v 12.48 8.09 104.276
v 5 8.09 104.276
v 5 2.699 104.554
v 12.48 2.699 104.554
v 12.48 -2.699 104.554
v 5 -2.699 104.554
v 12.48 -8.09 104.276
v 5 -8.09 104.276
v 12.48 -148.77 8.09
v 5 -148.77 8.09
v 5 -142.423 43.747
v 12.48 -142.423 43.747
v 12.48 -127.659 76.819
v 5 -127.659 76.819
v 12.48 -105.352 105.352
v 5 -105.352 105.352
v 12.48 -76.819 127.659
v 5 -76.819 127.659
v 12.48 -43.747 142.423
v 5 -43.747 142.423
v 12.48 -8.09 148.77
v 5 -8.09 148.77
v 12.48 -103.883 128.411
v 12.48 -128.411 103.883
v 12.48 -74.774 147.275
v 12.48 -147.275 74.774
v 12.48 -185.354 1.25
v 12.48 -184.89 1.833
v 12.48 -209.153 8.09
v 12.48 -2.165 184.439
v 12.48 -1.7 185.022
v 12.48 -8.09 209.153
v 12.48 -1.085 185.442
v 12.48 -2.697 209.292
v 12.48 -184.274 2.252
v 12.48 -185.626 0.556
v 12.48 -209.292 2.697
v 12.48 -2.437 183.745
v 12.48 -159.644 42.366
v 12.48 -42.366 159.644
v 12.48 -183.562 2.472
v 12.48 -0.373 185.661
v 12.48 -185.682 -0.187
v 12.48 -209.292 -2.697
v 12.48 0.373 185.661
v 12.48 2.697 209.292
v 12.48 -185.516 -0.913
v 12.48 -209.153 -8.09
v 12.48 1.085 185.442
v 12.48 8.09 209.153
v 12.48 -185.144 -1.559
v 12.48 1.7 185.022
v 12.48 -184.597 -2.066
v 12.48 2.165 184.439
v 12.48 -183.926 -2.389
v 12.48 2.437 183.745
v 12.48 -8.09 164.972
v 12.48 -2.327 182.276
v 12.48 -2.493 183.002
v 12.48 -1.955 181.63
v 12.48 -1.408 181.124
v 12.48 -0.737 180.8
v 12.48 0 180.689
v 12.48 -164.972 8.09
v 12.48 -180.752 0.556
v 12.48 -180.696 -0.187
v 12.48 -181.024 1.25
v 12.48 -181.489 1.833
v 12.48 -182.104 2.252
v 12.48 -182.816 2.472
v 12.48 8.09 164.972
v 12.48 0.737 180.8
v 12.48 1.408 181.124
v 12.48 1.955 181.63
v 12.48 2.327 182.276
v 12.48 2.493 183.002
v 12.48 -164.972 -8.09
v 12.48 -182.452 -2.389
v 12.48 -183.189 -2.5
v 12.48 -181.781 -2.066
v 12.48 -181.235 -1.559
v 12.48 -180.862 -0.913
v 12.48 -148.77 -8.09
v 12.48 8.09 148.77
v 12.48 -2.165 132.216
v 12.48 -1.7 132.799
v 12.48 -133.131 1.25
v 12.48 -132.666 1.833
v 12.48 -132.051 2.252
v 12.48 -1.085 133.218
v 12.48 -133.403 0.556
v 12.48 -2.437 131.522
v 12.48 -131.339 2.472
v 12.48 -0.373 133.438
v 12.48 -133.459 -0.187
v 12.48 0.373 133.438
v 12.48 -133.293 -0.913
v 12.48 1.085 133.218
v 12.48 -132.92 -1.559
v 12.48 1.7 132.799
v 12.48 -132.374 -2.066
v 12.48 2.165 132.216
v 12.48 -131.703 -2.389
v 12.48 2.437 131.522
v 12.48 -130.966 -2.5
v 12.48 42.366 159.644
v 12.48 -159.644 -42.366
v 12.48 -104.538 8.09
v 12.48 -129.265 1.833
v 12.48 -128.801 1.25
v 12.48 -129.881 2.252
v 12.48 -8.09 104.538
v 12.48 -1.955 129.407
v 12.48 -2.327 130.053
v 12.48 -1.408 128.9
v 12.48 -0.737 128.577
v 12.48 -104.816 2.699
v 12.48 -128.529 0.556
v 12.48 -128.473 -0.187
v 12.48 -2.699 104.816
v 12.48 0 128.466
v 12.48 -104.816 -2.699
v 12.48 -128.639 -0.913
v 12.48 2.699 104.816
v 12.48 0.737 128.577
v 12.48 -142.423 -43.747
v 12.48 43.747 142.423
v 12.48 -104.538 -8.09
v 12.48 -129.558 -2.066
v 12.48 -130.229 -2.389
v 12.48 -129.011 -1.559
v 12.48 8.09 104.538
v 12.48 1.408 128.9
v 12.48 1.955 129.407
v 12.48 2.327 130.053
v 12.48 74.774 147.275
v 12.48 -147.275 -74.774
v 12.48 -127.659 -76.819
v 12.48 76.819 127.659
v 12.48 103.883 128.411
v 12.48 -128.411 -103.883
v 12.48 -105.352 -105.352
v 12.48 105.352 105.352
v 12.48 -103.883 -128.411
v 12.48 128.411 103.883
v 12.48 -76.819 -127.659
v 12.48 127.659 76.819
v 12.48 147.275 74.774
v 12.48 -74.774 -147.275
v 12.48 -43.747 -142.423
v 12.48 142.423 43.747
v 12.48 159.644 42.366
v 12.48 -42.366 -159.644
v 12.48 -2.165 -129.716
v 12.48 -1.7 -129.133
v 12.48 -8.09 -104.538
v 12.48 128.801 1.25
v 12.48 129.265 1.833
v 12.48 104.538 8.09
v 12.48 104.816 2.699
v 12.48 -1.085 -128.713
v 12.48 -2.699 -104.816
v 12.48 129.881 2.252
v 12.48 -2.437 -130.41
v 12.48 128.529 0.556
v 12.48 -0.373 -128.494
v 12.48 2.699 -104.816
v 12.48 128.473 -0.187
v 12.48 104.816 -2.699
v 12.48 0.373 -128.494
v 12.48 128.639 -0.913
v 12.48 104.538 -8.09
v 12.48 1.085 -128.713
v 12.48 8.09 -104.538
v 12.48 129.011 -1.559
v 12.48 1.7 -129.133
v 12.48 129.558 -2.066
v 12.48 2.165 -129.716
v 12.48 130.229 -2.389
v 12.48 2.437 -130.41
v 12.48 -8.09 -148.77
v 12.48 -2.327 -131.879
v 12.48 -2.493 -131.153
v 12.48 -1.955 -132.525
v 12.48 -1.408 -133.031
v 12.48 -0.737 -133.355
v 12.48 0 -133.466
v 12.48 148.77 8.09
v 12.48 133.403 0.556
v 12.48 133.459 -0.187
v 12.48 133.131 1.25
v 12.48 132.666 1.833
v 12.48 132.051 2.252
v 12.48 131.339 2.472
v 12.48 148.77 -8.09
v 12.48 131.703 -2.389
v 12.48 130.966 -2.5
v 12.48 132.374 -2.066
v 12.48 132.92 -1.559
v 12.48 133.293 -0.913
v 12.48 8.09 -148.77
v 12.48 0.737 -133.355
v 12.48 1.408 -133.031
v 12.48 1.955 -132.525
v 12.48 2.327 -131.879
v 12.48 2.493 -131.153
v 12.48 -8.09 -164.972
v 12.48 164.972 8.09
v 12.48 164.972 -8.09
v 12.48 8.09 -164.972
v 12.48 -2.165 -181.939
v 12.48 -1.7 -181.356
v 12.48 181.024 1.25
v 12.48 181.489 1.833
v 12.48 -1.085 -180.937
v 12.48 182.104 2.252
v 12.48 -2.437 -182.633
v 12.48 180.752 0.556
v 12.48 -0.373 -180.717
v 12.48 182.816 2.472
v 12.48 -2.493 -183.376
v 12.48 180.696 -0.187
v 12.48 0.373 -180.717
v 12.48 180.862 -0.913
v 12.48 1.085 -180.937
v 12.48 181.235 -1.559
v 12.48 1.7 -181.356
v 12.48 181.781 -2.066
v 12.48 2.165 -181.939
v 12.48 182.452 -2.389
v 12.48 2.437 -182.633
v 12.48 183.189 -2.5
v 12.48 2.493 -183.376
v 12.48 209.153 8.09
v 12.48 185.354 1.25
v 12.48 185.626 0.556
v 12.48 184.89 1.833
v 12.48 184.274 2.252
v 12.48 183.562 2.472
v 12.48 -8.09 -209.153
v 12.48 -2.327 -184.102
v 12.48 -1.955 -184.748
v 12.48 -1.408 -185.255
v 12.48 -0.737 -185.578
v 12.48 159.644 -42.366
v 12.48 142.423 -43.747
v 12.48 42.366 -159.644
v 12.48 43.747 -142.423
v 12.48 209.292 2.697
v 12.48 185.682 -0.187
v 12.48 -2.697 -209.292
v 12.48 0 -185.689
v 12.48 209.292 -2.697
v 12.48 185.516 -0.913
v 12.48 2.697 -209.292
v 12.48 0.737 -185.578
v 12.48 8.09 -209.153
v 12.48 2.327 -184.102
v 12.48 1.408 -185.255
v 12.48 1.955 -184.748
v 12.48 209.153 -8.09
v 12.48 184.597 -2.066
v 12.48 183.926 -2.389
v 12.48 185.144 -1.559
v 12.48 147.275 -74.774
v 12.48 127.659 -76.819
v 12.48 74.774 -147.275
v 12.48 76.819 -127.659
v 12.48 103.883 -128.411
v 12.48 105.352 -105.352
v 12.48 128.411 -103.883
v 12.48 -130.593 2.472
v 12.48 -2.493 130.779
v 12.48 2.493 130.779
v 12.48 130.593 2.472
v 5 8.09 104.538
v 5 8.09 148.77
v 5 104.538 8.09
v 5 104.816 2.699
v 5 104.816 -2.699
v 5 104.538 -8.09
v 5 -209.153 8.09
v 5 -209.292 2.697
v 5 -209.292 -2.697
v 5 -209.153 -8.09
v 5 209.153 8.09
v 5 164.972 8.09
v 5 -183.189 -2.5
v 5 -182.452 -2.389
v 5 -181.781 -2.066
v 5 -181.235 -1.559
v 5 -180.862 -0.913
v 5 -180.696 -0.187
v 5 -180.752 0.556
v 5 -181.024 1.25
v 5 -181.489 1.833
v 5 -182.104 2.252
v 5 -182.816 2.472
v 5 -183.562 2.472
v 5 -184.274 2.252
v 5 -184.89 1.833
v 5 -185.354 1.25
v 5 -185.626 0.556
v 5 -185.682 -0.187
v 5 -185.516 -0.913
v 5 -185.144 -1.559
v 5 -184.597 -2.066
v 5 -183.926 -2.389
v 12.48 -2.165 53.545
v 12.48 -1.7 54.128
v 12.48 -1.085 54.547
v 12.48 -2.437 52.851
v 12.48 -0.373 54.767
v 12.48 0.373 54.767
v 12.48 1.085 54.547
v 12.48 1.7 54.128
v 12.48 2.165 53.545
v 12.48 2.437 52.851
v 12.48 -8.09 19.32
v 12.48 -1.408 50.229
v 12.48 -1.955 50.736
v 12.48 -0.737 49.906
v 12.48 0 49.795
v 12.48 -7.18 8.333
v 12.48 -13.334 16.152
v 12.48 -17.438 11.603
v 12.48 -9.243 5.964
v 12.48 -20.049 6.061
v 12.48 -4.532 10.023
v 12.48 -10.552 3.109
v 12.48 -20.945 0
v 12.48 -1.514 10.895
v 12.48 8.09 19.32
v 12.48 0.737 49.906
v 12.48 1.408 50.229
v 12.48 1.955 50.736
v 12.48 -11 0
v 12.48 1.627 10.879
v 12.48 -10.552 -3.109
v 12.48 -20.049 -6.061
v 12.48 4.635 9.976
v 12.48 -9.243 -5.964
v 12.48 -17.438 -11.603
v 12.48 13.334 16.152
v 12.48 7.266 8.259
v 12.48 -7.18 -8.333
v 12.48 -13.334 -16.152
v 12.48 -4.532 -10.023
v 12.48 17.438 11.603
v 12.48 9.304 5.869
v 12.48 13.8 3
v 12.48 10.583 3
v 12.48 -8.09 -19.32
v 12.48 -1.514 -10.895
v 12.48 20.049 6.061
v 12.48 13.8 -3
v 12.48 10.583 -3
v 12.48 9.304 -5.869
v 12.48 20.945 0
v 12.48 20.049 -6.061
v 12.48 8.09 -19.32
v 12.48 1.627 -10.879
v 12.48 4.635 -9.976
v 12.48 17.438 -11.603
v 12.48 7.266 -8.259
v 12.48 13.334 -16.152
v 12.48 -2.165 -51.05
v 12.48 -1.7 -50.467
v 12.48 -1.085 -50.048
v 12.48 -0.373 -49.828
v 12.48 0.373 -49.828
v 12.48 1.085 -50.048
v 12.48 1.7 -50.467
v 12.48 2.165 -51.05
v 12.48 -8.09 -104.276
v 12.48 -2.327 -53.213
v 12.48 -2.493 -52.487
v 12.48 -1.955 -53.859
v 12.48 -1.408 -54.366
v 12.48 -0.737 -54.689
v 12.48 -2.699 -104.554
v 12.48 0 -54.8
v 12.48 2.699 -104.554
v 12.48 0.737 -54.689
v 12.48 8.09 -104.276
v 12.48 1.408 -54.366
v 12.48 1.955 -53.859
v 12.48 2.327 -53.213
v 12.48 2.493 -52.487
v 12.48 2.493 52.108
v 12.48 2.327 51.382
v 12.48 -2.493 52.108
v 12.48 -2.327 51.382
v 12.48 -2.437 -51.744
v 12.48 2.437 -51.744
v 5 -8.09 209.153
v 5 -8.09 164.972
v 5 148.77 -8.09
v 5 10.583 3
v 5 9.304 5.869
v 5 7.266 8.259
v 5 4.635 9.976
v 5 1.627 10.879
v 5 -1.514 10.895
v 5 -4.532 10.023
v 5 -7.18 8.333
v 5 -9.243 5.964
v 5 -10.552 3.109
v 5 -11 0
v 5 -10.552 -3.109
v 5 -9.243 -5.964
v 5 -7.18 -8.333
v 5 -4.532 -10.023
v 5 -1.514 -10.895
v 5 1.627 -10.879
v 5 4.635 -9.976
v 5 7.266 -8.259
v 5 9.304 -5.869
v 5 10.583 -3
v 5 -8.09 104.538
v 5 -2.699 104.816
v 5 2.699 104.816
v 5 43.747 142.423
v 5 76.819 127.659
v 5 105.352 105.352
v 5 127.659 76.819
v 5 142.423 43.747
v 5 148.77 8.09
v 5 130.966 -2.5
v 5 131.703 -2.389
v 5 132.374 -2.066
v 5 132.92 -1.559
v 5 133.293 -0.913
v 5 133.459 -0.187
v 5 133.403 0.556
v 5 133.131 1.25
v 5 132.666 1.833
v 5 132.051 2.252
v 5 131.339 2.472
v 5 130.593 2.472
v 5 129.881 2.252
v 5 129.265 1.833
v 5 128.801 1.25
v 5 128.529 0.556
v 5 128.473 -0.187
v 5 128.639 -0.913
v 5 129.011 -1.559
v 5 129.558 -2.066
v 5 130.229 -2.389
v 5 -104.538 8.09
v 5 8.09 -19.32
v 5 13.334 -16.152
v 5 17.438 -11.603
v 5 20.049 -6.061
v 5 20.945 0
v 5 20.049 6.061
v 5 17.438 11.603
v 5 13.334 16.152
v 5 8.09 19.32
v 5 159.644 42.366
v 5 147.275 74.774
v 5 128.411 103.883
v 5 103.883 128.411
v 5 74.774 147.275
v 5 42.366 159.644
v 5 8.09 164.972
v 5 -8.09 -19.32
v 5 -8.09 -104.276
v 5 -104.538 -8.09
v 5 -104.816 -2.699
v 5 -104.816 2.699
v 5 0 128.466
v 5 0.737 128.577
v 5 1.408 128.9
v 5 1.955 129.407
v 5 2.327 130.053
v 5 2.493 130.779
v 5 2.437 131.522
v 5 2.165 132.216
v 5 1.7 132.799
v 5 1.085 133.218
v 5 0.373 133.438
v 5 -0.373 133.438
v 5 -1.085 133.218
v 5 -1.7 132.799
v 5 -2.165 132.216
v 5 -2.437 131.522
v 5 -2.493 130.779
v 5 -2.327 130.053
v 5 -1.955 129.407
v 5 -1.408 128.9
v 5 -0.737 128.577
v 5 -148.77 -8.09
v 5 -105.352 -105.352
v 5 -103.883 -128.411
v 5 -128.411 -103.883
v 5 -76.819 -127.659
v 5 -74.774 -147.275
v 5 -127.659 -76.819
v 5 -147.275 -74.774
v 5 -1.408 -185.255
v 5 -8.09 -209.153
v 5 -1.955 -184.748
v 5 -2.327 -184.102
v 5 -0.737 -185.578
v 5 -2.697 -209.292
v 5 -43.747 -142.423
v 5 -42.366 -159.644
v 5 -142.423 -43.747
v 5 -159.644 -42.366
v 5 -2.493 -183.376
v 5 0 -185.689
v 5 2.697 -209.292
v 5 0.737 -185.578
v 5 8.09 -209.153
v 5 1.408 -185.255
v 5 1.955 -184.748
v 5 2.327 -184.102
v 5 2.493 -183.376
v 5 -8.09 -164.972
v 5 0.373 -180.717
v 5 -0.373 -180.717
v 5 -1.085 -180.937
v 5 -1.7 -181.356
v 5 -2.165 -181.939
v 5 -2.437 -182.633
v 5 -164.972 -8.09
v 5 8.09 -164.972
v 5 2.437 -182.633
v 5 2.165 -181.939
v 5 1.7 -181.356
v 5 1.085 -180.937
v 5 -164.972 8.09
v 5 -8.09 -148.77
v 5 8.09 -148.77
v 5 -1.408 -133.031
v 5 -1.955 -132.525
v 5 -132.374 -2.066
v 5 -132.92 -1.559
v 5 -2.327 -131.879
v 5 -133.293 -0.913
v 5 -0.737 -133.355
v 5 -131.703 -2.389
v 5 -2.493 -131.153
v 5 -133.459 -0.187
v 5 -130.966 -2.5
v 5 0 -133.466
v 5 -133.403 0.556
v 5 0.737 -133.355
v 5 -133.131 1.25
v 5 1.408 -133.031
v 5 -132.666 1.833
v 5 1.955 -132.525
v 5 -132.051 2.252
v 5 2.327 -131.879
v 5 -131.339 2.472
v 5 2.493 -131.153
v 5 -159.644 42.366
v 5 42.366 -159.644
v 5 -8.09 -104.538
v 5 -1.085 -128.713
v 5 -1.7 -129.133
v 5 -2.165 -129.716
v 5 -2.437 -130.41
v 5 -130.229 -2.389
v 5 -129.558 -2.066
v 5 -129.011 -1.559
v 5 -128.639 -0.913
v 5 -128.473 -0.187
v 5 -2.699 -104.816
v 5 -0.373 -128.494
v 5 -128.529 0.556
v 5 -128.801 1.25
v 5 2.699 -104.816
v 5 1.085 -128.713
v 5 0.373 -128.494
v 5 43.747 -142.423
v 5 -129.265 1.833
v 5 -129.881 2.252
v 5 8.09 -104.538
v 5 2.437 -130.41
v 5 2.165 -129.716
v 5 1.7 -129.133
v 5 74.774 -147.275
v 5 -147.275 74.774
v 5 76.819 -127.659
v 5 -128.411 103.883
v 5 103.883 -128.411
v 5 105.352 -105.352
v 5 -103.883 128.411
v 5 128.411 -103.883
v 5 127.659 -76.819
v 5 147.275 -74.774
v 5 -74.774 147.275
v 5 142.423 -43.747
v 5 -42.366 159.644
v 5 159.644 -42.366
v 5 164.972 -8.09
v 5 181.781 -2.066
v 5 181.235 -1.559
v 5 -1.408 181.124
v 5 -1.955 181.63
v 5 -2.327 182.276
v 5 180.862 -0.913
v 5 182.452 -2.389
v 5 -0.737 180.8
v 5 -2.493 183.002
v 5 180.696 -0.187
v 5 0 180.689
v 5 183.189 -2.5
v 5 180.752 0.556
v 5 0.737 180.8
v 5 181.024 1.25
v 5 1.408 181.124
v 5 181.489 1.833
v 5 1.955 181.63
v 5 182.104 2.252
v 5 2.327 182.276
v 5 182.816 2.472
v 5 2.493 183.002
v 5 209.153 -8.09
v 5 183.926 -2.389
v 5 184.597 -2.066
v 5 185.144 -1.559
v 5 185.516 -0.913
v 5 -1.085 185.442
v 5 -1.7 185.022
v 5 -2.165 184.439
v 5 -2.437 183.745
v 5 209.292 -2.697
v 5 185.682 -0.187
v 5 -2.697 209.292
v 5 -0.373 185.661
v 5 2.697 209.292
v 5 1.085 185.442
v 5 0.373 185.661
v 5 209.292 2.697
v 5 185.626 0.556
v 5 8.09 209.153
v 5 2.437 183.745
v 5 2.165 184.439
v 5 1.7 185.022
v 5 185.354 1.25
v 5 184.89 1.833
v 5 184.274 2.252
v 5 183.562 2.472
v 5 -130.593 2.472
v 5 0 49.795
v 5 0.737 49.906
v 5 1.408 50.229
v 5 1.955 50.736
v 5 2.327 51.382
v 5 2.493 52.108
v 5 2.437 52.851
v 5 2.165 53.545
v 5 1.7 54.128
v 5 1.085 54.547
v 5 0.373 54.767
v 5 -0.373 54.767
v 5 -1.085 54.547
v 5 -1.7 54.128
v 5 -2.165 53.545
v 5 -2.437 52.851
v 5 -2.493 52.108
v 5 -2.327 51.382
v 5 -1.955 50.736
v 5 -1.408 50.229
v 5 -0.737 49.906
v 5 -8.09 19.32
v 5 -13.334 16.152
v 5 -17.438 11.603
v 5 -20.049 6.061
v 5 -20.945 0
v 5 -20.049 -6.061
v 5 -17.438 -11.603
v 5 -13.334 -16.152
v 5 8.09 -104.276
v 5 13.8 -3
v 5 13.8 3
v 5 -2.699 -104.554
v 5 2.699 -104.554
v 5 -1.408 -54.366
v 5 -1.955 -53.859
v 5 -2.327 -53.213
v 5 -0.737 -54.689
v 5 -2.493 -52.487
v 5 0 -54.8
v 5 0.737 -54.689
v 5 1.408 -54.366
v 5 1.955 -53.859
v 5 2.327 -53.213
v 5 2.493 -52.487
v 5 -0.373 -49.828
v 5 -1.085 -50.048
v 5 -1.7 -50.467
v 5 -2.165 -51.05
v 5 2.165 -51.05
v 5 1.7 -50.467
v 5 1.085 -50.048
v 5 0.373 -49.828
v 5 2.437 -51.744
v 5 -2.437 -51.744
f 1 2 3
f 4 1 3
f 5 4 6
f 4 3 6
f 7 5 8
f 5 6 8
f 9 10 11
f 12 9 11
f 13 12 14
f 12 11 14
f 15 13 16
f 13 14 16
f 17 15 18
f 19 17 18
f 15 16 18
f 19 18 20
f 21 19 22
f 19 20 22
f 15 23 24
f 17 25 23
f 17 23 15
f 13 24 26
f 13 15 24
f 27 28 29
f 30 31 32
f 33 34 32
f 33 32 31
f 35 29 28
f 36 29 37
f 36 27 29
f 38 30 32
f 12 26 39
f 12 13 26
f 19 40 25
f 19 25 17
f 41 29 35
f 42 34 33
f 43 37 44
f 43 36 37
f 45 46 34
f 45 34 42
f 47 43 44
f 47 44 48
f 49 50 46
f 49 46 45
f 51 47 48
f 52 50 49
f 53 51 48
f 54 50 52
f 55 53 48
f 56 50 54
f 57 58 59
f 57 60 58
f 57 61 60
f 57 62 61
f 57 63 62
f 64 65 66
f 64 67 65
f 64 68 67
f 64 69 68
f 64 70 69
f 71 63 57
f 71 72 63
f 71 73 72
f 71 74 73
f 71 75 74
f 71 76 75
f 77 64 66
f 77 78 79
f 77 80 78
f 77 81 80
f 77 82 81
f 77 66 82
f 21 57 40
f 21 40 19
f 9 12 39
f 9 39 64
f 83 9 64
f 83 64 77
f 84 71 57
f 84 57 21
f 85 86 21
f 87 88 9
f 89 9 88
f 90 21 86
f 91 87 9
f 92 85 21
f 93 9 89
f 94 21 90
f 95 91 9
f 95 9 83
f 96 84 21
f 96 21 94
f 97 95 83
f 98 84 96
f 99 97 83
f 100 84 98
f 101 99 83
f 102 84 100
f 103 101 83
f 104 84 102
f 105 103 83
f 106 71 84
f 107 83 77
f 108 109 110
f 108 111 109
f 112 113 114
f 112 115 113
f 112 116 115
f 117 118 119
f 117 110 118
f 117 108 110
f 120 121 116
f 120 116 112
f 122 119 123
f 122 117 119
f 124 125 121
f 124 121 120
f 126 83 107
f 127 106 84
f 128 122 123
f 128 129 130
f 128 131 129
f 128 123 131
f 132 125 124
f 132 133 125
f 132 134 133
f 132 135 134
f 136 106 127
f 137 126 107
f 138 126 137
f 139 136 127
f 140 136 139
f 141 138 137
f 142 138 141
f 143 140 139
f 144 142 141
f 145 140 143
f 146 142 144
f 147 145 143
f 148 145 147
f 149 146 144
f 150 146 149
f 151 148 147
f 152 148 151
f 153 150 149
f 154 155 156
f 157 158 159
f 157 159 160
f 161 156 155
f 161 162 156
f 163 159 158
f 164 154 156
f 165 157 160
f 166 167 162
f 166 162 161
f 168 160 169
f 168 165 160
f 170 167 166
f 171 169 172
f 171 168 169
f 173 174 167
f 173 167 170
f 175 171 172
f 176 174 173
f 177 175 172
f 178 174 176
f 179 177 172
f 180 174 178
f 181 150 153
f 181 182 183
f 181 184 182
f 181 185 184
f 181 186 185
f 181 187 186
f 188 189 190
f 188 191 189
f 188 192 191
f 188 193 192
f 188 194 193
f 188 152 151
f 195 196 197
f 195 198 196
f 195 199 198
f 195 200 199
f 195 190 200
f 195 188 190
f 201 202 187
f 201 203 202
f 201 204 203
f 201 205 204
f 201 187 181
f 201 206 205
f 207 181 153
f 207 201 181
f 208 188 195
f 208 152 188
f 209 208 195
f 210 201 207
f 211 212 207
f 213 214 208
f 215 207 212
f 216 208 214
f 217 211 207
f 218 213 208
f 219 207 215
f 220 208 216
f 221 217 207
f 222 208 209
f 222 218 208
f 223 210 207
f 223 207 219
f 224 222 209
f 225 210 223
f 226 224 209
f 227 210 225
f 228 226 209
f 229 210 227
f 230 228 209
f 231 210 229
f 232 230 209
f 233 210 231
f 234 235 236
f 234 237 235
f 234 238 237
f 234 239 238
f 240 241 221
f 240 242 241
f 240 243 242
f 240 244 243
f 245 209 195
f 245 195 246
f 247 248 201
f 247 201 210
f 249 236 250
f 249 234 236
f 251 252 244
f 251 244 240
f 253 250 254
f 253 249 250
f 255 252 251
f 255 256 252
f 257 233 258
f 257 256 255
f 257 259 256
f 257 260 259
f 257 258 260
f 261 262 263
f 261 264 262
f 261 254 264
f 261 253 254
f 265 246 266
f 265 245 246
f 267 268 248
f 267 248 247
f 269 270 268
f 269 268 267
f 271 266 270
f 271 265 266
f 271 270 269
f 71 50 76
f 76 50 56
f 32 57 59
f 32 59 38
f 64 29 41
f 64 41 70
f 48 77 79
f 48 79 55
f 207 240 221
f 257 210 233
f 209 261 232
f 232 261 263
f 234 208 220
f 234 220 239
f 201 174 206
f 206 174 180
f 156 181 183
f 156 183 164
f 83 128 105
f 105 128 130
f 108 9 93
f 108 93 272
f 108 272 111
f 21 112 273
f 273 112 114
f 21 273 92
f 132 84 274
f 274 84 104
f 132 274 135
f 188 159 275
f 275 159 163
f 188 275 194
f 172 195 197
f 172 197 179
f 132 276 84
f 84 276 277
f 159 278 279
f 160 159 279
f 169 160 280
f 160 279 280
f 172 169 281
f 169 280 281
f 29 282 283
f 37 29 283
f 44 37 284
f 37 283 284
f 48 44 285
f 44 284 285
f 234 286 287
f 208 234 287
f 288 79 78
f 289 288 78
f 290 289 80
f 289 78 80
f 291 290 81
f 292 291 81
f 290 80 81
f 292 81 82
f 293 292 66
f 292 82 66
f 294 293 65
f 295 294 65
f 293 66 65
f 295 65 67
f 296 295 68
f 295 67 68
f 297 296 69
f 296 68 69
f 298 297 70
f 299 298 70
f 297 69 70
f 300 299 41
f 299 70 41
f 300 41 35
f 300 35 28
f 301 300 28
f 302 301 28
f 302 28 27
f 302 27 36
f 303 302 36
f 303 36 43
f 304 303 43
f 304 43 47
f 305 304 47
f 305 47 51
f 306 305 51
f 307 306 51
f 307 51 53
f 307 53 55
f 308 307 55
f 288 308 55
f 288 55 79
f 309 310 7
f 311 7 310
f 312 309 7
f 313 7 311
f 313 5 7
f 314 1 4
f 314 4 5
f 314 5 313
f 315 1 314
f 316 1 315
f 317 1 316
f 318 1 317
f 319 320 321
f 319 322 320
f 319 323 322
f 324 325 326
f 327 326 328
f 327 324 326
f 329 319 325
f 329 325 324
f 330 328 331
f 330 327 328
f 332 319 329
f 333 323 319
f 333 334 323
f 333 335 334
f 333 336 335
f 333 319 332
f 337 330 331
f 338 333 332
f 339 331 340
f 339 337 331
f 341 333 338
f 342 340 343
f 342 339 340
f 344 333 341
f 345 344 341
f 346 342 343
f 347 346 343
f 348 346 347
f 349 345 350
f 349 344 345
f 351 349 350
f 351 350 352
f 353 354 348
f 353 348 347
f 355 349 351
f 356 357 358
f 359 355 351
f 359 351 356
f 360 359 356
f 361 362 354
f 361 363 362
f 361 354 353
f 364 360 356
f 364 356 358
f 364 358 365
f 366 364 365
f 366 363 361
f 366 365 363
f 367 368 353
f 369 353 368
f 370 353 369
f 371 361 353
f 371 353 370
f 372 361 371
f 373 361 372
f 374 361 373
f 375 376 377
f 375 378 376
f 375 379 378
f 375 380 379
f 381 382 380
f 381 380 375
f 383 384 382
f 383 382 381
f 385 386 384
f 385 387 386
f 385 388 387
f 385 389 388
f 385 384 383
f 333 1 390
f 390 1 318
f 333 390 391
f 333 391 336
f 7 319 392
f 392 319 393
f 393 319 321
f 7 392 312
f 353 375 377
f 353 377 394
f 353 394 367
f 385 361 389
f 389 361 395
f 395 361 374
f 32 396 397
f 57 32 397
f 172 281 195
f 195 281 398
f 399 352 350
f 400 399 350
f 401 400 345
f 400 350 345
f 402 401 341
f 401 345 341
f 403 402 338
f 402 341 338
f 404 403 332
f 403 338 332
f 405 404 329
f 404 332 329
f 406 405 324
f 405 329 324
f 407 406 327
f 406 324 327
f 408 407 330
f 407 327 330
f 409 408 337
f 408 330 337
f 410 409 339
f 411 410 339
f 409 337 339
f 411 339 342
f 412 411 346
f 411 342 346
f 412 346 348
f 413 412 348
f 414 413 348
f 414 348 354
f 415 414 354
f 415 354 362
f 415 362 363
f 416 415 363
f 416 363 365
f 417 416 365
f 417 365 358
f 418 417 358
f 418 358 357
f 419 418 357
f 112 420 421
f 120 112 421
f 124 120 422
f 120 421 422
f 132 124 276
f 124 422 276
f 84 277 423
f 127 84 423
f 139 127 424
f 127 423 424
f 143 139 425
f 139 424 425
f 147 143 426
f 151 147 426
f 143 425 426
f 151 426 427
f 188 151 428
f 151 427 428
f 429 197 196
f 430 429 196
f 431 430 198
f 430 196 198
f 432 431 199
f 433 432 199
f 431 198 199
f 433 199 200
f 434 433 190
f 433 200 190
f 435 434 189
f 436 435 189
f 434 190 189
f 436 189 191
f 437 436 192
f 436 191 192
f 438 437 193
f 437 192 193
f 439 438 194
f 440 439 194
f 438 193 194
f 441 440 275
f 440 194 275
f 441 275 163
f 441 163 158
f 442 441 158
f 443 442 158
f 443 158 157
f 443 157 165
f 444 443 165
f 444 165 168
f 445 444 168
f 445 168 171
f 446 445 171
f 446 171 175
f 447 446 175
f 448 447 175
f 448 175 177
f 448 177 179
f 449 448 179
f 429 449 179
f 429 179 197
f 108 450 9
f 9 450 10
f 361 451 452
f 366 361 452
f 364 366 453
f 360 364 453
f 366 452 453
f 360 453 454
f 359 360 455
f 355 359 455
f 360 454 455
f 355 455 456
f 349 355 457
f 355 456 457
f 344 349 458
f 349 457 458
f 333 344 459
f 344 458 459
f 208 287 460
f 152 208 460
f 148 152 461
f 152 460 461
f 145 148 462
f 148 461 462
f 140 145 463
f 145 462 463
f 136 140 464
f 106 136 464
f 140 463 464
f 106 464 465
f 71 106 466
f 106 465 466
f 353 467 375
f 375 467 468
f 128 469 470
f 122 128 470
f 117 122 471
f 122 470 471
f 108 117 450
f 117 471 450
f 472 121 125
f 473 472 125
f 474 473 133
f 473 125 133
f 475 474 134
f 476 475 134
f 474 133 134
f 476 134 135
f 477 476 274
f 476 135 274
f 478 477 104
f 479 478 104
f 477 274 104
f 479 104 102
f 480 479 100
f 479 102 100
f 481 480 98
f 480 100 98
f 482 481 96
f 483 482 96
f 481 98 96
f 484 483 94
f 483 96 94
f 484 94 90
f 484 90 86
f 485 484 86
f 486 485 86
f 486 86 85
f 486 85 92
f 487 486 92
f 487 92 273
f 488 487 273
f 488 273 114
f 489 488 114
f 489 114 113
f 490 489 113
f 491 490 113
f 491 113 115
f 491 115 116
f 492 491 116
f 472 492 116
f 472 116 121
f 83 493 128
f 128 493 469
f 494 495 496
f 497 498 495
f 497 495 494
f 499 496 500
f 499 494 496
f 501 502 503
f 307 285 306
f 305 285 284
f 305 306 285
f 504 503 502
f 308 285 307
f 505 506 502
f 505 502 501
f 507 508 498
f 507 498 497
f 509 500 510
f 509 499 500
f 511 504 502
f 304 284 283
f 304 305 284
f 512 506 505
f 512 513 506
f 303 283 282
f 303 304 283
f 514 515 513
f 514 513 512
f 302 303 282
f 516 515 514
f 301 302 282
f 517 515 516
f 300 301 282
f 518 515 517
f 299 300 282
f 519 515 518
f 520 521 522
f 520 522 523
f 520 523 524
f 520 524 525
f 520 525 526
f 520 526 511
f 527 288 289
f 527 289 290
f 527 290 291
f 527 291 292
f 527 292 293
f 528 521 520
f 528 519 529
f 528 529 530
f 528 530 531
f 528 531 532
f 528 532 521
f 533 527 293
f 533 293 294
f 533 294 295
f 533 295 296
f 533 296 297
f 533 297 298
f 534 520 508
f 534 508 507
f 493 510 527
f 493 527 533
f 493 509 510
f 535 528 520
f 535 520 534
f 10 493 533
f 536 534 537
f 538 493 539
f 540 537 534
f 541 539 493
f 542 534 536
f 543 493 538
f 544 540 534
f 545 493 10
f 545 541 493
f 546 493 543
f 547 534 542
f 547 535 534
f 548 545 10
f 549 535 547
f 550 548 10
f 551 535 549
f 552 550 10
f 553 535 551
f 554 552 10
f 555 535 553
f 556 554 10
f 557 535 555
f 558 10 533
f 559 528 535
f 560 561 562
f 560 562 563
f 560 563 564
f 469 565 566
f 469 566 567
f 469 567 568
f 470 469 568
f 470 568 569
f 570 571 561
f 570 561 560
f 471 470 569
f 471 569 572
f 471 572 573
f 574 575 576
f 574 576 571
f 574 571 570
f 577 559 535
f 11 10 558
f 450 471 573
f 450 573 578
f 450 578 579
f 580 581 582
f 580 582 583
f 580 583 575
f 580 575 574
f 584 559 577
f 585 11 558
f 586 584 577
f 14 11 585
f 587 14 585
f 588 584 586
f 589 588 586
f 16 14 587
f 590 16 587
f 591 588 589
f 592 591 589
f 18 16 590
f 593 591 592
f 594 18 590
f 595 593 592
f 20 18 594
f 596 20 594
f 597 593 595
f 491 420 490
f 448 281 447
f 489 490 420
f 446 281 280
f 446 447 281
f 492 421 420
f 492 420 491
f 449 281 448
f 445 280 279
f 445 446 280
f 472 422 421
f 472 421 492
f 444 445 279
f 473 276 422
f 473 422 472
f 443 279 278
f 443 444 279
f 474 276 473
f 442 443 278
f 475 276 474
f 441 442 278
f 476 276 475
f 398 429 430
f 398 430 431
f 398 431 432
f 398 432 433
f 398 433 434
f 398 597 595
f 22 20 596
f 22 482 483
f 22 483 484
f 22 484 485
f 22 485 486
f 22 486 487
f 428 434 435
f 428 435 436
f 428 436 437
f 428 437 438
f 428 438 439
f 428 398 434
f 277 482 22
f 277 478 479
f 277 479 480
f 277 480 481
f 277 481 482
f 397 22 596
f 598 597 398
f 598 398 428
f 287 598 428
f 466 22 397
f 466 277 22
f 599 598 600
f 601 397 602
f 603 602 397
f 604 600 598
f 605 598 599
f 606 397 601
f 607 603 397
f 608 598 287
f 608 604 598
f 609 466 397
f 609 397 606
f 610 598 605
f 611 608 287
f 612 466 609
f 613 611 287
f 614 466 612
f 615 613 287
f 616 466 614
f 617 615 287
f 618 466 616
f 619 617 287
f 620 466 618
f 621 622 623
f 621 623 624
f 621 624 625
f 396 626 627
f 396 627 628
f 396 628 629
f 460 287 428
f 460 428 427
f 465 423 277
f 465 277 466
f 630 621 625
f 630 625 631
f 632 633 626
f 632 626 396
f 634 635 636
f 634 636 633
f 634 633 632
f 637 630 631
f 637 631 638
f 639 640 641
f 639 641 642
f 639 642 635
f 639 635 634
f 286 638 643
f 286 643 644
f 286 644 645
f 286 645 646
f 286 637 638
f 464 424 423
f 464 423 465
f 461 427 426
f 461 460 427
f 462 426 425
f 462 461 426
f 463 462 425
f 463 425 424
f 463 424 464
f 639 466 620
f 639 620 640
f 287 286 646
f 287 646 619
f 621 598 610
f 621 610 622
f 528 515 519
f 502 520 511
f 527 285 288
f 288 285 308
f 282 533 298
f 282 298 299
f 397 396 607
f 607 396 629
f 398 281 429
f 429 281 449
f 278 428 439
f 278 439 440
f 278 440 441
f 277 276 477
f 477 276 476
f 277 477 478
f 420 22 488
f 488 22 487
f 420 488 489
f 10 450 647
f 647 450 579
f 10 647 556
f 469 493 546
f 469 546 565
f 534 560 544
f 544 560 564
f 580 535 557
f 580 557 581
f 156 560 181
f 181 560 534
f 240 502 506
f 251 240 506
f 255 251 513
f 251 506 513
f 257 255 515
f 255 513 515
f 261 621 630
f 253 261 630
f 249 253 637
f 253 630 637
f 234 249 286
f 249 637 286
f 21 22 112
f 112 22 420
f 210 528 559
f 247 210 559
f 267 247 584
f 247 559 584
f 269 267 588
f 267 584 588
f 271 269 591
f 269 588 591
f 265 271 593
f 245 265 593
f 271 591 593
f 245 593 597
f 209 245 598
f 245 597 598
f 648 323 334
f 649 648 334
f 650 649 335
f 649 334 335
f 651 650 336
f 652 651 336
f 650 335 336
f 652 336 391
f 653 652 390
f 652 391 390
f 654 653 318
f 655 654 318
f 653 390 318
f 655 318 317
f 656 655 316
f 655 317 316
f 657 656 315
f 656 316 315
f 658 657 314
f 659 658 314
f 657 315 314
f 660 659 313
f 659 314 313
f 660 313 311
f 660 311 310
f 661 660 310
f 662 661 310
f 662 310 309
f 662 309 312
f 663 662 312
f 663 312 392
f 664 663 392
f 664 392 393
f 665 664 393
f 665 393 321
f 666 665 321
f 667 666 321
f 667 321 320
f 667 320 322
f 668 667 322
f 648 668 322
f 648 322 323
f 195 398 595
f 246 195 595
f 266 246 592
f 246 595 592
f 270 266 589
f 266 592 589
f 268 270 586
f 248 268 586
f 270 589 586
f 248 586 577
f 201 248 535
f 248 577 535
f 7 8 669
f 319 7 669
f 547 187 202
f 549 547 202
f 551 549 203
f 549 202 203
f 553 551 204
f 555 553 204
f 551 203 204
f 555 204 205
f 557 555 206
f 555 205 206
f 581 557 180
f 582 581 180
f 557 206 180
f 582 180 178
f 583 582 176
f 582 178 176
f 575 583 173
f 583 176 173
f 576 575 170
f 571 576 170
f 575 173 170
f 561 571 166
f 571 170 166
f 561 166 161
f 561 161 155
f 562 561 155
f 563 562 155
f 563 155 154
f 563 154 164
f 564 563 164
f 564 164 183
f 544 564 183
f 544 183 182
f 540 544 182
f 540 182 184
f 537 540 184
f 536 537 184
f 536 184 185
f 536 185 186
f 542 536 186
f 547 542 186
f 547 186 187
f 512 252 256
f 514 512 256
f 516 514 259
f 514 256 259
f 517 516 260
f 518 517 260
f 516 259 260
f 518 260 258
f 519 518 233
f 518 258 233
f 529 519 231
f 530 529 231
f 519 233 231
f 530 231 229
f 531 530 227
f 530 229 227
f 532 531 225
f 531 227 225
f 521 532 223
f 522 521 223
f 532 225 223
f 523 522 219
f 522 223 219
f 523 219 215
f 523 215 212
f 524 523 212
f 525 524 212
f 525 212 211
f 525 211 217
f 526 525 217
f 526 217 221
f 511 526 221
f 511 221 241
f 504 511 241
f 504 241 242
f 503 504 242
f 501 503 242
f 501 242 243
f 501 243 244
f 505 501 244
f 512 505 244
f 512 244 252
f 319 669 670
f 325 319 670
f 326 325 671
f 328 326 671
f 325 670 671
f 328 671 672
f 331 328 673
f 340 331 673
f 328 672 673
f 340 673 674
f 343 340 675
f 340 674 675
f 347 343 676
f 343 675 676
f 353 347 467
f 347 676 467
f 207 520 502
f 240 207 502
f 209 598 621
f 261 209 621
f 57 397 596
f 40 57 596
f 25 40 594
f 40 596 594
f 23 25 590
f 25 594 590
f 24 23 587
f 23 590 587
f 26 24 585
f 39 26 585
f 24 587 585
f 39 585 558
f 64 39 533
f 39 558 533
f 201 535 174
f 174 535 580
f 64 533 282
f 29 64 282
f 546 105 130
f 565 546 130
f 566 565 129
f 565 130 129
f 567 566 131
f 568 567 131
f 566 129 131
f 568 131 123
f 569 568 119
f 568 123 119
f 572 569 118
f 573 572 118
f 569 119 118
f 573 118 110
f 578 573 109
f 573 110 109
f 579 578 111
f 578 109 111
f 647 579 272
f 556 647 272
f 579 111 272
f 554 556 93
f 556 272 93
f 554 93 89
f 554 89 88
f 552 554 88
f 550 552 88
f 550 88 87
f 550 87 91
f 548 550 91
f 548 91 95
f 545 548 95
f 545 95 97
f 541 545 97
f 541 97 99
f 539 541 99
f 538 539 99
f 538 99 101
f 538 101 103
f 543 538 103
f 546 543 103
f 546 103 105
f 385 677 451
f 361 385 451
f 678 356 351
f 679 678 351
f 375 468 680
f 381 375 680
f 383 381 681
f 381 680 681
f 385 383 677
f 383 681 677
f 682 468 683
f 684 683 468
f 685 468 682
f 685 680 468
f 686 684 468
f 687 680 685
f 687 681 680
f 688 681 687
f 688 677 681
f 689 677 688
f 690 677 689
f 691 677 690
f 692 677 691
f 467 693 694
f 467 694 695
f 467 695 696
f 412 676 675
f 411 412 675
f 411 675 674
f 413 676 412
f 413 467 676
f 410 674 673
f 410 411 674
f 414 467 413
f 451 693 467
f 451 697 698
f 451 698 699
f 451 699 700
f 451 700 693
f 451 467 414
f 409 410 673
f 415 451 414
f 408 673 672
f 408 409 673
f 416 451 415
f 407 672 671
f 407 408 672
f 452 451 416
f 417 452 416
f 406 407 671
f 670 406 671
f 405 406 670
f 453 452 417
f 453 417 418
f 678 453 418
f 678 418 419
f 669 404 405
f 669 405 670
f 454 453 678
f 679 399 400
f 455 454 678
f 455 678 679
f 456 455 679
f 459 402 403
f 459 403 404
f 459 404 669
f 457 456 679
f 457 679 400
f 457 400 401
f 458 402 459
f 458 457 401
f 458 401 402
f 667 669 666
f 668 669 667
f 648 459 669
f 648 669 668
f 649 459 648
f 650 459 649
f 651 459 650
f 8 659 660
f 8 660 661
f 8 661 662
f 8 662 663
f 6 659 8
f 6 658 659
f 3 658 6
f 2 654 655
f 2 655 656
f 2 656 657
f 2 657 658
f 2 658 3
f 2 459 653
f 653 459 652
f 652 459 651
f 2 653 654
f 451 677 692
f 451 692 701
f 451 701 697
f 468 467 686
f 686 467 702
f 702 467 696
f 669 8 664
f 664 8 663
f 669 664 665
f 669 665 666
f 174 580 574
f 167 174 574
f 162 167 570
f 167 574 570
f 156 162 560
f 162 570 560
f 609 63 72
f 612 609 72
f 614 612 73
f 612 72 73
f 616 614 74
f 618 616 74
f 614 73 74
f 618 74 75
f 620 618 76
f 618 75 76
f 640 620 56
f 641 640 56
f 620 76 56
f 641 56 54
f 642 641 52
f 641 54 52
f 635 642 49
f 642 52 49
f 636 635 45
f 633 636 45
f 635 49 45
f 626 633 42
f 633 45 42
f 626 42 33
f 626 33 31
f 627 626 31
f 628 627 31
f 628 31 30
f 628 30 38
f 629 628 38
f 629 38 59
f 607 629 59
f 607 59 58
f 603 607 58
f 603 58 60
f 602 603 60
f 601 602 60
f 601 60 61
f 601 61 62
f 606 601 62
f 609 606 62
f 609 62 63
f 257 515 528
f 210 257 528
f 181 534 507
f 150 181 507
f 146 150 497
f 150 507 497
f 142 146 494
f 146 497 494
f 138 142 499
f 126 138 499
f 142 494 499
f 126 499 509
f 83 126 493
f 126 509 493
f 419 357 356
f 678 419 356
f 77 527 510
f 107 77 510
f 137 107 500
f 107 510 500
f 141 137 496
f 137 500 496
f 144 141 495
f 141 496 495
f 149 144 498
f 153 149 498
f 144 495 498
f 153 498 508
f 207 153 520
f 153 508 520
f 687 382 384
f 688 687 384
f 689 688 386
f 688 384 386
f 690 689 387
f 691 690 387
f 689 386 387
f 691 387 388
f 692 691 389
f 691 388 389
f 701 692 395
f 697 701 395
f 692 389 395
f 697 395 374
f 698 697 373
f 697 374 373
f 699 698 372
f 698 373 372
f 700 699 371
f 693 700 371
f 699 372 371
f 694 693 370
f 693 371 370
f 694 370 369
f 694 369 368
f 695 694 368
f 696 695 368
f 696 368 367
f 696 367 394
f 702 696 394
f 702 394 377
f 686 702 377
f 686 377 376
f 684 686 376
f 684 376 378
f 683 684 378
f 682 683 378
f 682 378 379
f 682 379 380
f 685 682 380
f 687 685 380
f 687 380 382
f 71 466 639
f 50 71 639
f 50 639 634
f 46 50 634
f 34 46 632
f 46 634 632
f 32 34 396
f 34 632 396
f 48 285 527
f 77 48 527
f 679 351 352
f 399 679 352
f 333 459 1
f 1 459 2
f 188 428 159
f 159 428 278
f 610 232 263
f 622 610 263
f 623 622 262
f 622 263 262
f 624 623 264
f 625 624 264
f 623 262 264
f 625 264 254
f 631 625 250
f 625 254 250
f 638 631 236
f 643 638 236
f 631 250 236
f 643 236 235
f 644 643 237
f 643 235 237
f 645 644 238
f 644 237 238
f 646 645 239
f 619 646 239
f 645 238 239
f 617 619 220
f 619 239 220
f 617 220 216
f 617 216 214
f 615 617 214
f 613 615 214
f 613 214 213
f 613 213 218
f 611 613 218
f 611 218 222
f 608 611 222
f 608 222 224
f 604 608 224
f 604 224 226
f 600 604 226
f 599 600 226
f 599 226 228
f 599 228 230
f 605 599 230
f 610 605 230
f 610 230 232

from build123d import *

# Parameters (mm, degrees)
SKETCH1_W           = 450
SKETCH1_H           = 450
BOSS_EXTRUDE1_DEPTH = 5
BOSS_EXTRUDE2_DEPTH = 7.48
BOSS_EXTRUDE3_DEPTH = 7.48
SKETCH6_W           = 450
SKETCH6_H           = 450
CUT_EXTRUDE1_DEPTH  = 5
SKETCH7_R           = 11
SKETCH7_R_2         = 2.5
CUT_EXTRUDE2_DEPTH  = 10


# Read off the part's stored shape, not the designer's step: Boss-Extrude2
with BuildPart() as part:
    # Sketch1 → Boss-Extrude1 (new body)
    with BuildSketch(Plane(origin=(0, 0, 0), x_dir=(0, 0, -1), z_dir=(1, 0, 0))):
        Rectangle(SKETCH1_W, SKETCH1_H)
    extrude(amount=BOSS_EXTRUDE1_DEPTH)

    # Boss-Extrude2 outline → Boss-Extrude2 (add)
    with BuildSketch(Plane(origin=(5, 0, 0), x_dir=(0, 0, -1), z_dir=(1, 0, 0))):
        with BuildLine():
            Line((-164.971757583, 8.09), (-209.152698388, 8.09))
            ThreePointArc((-209.152698388, 8.09), (-209.3091, 0), (-209.152698388, -8.09))
            Line((-209.152698388, -8.09), (-164.971757583, -8.09))
            ThreePointArc((-164.971757583, -8.09), (-116.792827049, -116.792827049), (-8.09, -164.971757583))
            Line((-8.09, -164.971757583), (-8.09, -209.152698388))
            ThreePointArc((-8.09, -209.152698388), (0, -209.3091), (8.09, -209.152698388))
            Line((8.09, -209.152698388), (8.09, -164.971757583))
            ThreePointArc((8.09, -164.971757583), (116.792827049, -116.792827049), (164.971757583, -8.09))
            Line((164.971757583, -8.09), (209.152698388, -8.09))
            ThreePointArc((209.152698388, -8.09), (209.3091, 0), (209.152698388, 8.09))
            Line((209.152698388, 8.09), (164.971757583, 8.09))
            ThreePointArc((164.971757583, 8.09), (116.792827049, 116.792827049), (8.09, 164.971757583))
            Line((8.09, 164.971757583), (8.09, 209.152698388))
            ThreePointArc((8.09, 209.152698388), (0, 209.3091), (-8.09, 209.152698388))
            Line((-8.09, 209.152698388), (-8.09, 164.971757583))
            ThreePointArc((-8.09, 164.971757583), (-116.792827049, 116.792827049), (-164.971757583, 8.09))
        make_face()
        with BuildLine():
            Line((148.770198629, 8.09), (104.538333308, 8.09))
            ThreePointArc((104.538333308, 8.09), (104.8509, 0), (104.538333308, -8.09))
            Line((104.538333308, -8.09), (148.770198629, -8.09))
            ThreePointArc((148.770198629, -8.09), (105.351839329, -105.351839329), (8.09, -148.770198629))
            Line((8.09, -148.770198629), (8.09, -104.538333308))
            ThreePointArc((8.09, -104.538333308), (0, -104.8509), (-8.09, -104.538333308))
            Line((-8.09, -104.538333308), (-8.09, -148.770198629))
            ThreePointArc((-8.09, -148.770198629), (-105.351839329, -105.351839329), (-148.770198629, -8.09))
            Line((-148.770198629, -8.09), (-104.538333308, -8.09))
            ThreePointArc((-104.538333308, -8.09), (-104.8509, 0), (-104.538333308, 8.09))
            Line((-104.538333308, 8.09), (-148.770198629, 8.09))
            ThreePointArc((-148.770198629, 8.09), (-105.351839329, 105.351839329), (-8.09, 148.770198629))
            Line((-8.09, 148.770198629), (-8.09, 104.538333308))
            ThreePointArc((-8.09, 104.538333308), (0, 104.8509), (8.09, 104.538333308))
            Line((8.09, 104.538333308), (8.09, 148.770198629))
            ThreePointArc((8.09, 148.770198629), (105.351839329, 105.351839329), (148.770198629, 8.09))
        make_face(mode=Mode.SUBTRACT)
    extrude(amount=BOSS_EXTRUDE2_DEPTH)

    # Sketch5 → Boss-Extrude3 (add)
    with BuildSketch(Plane(origin=(5, 0, 0), x_dir=(0, 0, -1), z_dir=(1, 0, 0))):
        with BuildLine():
            Line((-19.319547743, 8.09), (-104.275748565, 8.09))
            ThreePointArc((-104.275748565, 8.09), (-104.5891, 0), (-104.275748565, -8.09))
            Line((-104.275748565, -8.09), (-19.319547743, -8.09))
            ThreePointArc((-19.319547743, -8.09), (0, -20.945), (19.319547743, -8.09))
            Line((19.319547743, -8.09), (104.275748565, -8.09))
            ThreePointArc((104.275748565, -8.09), (104.5891, 0), (104.275748565, 8.09))
            Line((104.275748565, 8.09), (19.319547743, 8.09))
            ThreePointArc((19.319547743, 8.09), (0, 20.945), (-19.319547743, 8.09))
        make_face()
    extrude(amount=BOSS_EXTRUDE3_DEPTH)

    # Sketch6 → Cut-Extrude1 (cut)
    with BuildSketch(Plane.ZY):
        Rectangle(SKETCH6_W, SKETCH6_H)
    extrude(amount=-CUT_EXTRUDE1_DEPTH, mode=Mode.SUBTRACT)


with BuildPart() as cut_extrude1_piece_1:
    # of the separate pieces the step leaves, piece 1, a body of its own (cut_extrude1_pieces)
    add(part.part.solids().sort_by_distance((5, 209.152698388, 8.09))[0])


with BuildPart() as cut_extrude1_piece_2:
    # of the separate pieces the step leaves, piece 2, a body of its own (cut_extrude1_pieces)
    add(part.part.solids().sort_by_distance((5, 8.09, -104.275748565))[0])


with BuildPart() as cut_extrude2_tool:
    # Sketch7 → Cut-Extrude2 (new body)
    with BuildSketch(Plane(origin=(12.48, 0, 0), x_dir=(0, 0, -1), z_dir=(1, 0, 0))):
        Circle(SKETCH7_R)
        with Locations((-183.1891, 0)):
            Circle(SKETCH7_R_2)
        with Locations((-130.9659, 0)):
            Circle(SKETCH7_R_2)
        with Locations((0, -183.1891)):
            Circle(SKETCH7_R_2)
        with Locations((0, -130.9659)):
            Circle(SKETCH7_R_2)
        with Locations((183.1891, 0)):
            Circle(SKETCH7_R_2)
        with Locations((52.3, 0)):
            Circle(SKETCH7_R_2)
        with Locations((-52.295, 0)):
            Circle(SKETCH7_R_2)
        with Locations((0, 183.1891)):
            Circle(SKETCH7_R_2)
        with Locations((0, 130.9659)):
            Circle(SKETCH7_R_2)
        with BuildLine():
            Line((-3, 13.8), (-3, 10.583005244))
            ThreePointArc((-3, 10.583005244), (0, 11), (3, 10.583005244))
            Line((3, 10.583005244), (3, 13.8))
            Line((3, 13.8), (-3, 13.8))
        make_face()
        with Locations((130.9659, 0)):
            Circle(SKETCH7_R_2)
    extrude(amount=-CUT_EXTRUDE2_DEPTH)


with BuildPart() as cut_extrude1_piece_1_1:
    add(cut_extrude1_piece_1.part)

    # Cut-Extrude2: cut by cut_extrude2_tool
    add(cut_extrude2_tool.part, mode=Mode.SUBTRACT)


with BuildPart() as cut_extrude1_piece_2_1:
    add(cut_extrude1_piece_2.part)

    # Cut-Extrude2: cut by cut_extrude2_tool
    add(cut_extrude2_tool.part, mode=Mode.SUBTRACT)


solid = Compound([cut_extrude1_piece_1_1.part, cut_extrude1_piece_2_1.part])
